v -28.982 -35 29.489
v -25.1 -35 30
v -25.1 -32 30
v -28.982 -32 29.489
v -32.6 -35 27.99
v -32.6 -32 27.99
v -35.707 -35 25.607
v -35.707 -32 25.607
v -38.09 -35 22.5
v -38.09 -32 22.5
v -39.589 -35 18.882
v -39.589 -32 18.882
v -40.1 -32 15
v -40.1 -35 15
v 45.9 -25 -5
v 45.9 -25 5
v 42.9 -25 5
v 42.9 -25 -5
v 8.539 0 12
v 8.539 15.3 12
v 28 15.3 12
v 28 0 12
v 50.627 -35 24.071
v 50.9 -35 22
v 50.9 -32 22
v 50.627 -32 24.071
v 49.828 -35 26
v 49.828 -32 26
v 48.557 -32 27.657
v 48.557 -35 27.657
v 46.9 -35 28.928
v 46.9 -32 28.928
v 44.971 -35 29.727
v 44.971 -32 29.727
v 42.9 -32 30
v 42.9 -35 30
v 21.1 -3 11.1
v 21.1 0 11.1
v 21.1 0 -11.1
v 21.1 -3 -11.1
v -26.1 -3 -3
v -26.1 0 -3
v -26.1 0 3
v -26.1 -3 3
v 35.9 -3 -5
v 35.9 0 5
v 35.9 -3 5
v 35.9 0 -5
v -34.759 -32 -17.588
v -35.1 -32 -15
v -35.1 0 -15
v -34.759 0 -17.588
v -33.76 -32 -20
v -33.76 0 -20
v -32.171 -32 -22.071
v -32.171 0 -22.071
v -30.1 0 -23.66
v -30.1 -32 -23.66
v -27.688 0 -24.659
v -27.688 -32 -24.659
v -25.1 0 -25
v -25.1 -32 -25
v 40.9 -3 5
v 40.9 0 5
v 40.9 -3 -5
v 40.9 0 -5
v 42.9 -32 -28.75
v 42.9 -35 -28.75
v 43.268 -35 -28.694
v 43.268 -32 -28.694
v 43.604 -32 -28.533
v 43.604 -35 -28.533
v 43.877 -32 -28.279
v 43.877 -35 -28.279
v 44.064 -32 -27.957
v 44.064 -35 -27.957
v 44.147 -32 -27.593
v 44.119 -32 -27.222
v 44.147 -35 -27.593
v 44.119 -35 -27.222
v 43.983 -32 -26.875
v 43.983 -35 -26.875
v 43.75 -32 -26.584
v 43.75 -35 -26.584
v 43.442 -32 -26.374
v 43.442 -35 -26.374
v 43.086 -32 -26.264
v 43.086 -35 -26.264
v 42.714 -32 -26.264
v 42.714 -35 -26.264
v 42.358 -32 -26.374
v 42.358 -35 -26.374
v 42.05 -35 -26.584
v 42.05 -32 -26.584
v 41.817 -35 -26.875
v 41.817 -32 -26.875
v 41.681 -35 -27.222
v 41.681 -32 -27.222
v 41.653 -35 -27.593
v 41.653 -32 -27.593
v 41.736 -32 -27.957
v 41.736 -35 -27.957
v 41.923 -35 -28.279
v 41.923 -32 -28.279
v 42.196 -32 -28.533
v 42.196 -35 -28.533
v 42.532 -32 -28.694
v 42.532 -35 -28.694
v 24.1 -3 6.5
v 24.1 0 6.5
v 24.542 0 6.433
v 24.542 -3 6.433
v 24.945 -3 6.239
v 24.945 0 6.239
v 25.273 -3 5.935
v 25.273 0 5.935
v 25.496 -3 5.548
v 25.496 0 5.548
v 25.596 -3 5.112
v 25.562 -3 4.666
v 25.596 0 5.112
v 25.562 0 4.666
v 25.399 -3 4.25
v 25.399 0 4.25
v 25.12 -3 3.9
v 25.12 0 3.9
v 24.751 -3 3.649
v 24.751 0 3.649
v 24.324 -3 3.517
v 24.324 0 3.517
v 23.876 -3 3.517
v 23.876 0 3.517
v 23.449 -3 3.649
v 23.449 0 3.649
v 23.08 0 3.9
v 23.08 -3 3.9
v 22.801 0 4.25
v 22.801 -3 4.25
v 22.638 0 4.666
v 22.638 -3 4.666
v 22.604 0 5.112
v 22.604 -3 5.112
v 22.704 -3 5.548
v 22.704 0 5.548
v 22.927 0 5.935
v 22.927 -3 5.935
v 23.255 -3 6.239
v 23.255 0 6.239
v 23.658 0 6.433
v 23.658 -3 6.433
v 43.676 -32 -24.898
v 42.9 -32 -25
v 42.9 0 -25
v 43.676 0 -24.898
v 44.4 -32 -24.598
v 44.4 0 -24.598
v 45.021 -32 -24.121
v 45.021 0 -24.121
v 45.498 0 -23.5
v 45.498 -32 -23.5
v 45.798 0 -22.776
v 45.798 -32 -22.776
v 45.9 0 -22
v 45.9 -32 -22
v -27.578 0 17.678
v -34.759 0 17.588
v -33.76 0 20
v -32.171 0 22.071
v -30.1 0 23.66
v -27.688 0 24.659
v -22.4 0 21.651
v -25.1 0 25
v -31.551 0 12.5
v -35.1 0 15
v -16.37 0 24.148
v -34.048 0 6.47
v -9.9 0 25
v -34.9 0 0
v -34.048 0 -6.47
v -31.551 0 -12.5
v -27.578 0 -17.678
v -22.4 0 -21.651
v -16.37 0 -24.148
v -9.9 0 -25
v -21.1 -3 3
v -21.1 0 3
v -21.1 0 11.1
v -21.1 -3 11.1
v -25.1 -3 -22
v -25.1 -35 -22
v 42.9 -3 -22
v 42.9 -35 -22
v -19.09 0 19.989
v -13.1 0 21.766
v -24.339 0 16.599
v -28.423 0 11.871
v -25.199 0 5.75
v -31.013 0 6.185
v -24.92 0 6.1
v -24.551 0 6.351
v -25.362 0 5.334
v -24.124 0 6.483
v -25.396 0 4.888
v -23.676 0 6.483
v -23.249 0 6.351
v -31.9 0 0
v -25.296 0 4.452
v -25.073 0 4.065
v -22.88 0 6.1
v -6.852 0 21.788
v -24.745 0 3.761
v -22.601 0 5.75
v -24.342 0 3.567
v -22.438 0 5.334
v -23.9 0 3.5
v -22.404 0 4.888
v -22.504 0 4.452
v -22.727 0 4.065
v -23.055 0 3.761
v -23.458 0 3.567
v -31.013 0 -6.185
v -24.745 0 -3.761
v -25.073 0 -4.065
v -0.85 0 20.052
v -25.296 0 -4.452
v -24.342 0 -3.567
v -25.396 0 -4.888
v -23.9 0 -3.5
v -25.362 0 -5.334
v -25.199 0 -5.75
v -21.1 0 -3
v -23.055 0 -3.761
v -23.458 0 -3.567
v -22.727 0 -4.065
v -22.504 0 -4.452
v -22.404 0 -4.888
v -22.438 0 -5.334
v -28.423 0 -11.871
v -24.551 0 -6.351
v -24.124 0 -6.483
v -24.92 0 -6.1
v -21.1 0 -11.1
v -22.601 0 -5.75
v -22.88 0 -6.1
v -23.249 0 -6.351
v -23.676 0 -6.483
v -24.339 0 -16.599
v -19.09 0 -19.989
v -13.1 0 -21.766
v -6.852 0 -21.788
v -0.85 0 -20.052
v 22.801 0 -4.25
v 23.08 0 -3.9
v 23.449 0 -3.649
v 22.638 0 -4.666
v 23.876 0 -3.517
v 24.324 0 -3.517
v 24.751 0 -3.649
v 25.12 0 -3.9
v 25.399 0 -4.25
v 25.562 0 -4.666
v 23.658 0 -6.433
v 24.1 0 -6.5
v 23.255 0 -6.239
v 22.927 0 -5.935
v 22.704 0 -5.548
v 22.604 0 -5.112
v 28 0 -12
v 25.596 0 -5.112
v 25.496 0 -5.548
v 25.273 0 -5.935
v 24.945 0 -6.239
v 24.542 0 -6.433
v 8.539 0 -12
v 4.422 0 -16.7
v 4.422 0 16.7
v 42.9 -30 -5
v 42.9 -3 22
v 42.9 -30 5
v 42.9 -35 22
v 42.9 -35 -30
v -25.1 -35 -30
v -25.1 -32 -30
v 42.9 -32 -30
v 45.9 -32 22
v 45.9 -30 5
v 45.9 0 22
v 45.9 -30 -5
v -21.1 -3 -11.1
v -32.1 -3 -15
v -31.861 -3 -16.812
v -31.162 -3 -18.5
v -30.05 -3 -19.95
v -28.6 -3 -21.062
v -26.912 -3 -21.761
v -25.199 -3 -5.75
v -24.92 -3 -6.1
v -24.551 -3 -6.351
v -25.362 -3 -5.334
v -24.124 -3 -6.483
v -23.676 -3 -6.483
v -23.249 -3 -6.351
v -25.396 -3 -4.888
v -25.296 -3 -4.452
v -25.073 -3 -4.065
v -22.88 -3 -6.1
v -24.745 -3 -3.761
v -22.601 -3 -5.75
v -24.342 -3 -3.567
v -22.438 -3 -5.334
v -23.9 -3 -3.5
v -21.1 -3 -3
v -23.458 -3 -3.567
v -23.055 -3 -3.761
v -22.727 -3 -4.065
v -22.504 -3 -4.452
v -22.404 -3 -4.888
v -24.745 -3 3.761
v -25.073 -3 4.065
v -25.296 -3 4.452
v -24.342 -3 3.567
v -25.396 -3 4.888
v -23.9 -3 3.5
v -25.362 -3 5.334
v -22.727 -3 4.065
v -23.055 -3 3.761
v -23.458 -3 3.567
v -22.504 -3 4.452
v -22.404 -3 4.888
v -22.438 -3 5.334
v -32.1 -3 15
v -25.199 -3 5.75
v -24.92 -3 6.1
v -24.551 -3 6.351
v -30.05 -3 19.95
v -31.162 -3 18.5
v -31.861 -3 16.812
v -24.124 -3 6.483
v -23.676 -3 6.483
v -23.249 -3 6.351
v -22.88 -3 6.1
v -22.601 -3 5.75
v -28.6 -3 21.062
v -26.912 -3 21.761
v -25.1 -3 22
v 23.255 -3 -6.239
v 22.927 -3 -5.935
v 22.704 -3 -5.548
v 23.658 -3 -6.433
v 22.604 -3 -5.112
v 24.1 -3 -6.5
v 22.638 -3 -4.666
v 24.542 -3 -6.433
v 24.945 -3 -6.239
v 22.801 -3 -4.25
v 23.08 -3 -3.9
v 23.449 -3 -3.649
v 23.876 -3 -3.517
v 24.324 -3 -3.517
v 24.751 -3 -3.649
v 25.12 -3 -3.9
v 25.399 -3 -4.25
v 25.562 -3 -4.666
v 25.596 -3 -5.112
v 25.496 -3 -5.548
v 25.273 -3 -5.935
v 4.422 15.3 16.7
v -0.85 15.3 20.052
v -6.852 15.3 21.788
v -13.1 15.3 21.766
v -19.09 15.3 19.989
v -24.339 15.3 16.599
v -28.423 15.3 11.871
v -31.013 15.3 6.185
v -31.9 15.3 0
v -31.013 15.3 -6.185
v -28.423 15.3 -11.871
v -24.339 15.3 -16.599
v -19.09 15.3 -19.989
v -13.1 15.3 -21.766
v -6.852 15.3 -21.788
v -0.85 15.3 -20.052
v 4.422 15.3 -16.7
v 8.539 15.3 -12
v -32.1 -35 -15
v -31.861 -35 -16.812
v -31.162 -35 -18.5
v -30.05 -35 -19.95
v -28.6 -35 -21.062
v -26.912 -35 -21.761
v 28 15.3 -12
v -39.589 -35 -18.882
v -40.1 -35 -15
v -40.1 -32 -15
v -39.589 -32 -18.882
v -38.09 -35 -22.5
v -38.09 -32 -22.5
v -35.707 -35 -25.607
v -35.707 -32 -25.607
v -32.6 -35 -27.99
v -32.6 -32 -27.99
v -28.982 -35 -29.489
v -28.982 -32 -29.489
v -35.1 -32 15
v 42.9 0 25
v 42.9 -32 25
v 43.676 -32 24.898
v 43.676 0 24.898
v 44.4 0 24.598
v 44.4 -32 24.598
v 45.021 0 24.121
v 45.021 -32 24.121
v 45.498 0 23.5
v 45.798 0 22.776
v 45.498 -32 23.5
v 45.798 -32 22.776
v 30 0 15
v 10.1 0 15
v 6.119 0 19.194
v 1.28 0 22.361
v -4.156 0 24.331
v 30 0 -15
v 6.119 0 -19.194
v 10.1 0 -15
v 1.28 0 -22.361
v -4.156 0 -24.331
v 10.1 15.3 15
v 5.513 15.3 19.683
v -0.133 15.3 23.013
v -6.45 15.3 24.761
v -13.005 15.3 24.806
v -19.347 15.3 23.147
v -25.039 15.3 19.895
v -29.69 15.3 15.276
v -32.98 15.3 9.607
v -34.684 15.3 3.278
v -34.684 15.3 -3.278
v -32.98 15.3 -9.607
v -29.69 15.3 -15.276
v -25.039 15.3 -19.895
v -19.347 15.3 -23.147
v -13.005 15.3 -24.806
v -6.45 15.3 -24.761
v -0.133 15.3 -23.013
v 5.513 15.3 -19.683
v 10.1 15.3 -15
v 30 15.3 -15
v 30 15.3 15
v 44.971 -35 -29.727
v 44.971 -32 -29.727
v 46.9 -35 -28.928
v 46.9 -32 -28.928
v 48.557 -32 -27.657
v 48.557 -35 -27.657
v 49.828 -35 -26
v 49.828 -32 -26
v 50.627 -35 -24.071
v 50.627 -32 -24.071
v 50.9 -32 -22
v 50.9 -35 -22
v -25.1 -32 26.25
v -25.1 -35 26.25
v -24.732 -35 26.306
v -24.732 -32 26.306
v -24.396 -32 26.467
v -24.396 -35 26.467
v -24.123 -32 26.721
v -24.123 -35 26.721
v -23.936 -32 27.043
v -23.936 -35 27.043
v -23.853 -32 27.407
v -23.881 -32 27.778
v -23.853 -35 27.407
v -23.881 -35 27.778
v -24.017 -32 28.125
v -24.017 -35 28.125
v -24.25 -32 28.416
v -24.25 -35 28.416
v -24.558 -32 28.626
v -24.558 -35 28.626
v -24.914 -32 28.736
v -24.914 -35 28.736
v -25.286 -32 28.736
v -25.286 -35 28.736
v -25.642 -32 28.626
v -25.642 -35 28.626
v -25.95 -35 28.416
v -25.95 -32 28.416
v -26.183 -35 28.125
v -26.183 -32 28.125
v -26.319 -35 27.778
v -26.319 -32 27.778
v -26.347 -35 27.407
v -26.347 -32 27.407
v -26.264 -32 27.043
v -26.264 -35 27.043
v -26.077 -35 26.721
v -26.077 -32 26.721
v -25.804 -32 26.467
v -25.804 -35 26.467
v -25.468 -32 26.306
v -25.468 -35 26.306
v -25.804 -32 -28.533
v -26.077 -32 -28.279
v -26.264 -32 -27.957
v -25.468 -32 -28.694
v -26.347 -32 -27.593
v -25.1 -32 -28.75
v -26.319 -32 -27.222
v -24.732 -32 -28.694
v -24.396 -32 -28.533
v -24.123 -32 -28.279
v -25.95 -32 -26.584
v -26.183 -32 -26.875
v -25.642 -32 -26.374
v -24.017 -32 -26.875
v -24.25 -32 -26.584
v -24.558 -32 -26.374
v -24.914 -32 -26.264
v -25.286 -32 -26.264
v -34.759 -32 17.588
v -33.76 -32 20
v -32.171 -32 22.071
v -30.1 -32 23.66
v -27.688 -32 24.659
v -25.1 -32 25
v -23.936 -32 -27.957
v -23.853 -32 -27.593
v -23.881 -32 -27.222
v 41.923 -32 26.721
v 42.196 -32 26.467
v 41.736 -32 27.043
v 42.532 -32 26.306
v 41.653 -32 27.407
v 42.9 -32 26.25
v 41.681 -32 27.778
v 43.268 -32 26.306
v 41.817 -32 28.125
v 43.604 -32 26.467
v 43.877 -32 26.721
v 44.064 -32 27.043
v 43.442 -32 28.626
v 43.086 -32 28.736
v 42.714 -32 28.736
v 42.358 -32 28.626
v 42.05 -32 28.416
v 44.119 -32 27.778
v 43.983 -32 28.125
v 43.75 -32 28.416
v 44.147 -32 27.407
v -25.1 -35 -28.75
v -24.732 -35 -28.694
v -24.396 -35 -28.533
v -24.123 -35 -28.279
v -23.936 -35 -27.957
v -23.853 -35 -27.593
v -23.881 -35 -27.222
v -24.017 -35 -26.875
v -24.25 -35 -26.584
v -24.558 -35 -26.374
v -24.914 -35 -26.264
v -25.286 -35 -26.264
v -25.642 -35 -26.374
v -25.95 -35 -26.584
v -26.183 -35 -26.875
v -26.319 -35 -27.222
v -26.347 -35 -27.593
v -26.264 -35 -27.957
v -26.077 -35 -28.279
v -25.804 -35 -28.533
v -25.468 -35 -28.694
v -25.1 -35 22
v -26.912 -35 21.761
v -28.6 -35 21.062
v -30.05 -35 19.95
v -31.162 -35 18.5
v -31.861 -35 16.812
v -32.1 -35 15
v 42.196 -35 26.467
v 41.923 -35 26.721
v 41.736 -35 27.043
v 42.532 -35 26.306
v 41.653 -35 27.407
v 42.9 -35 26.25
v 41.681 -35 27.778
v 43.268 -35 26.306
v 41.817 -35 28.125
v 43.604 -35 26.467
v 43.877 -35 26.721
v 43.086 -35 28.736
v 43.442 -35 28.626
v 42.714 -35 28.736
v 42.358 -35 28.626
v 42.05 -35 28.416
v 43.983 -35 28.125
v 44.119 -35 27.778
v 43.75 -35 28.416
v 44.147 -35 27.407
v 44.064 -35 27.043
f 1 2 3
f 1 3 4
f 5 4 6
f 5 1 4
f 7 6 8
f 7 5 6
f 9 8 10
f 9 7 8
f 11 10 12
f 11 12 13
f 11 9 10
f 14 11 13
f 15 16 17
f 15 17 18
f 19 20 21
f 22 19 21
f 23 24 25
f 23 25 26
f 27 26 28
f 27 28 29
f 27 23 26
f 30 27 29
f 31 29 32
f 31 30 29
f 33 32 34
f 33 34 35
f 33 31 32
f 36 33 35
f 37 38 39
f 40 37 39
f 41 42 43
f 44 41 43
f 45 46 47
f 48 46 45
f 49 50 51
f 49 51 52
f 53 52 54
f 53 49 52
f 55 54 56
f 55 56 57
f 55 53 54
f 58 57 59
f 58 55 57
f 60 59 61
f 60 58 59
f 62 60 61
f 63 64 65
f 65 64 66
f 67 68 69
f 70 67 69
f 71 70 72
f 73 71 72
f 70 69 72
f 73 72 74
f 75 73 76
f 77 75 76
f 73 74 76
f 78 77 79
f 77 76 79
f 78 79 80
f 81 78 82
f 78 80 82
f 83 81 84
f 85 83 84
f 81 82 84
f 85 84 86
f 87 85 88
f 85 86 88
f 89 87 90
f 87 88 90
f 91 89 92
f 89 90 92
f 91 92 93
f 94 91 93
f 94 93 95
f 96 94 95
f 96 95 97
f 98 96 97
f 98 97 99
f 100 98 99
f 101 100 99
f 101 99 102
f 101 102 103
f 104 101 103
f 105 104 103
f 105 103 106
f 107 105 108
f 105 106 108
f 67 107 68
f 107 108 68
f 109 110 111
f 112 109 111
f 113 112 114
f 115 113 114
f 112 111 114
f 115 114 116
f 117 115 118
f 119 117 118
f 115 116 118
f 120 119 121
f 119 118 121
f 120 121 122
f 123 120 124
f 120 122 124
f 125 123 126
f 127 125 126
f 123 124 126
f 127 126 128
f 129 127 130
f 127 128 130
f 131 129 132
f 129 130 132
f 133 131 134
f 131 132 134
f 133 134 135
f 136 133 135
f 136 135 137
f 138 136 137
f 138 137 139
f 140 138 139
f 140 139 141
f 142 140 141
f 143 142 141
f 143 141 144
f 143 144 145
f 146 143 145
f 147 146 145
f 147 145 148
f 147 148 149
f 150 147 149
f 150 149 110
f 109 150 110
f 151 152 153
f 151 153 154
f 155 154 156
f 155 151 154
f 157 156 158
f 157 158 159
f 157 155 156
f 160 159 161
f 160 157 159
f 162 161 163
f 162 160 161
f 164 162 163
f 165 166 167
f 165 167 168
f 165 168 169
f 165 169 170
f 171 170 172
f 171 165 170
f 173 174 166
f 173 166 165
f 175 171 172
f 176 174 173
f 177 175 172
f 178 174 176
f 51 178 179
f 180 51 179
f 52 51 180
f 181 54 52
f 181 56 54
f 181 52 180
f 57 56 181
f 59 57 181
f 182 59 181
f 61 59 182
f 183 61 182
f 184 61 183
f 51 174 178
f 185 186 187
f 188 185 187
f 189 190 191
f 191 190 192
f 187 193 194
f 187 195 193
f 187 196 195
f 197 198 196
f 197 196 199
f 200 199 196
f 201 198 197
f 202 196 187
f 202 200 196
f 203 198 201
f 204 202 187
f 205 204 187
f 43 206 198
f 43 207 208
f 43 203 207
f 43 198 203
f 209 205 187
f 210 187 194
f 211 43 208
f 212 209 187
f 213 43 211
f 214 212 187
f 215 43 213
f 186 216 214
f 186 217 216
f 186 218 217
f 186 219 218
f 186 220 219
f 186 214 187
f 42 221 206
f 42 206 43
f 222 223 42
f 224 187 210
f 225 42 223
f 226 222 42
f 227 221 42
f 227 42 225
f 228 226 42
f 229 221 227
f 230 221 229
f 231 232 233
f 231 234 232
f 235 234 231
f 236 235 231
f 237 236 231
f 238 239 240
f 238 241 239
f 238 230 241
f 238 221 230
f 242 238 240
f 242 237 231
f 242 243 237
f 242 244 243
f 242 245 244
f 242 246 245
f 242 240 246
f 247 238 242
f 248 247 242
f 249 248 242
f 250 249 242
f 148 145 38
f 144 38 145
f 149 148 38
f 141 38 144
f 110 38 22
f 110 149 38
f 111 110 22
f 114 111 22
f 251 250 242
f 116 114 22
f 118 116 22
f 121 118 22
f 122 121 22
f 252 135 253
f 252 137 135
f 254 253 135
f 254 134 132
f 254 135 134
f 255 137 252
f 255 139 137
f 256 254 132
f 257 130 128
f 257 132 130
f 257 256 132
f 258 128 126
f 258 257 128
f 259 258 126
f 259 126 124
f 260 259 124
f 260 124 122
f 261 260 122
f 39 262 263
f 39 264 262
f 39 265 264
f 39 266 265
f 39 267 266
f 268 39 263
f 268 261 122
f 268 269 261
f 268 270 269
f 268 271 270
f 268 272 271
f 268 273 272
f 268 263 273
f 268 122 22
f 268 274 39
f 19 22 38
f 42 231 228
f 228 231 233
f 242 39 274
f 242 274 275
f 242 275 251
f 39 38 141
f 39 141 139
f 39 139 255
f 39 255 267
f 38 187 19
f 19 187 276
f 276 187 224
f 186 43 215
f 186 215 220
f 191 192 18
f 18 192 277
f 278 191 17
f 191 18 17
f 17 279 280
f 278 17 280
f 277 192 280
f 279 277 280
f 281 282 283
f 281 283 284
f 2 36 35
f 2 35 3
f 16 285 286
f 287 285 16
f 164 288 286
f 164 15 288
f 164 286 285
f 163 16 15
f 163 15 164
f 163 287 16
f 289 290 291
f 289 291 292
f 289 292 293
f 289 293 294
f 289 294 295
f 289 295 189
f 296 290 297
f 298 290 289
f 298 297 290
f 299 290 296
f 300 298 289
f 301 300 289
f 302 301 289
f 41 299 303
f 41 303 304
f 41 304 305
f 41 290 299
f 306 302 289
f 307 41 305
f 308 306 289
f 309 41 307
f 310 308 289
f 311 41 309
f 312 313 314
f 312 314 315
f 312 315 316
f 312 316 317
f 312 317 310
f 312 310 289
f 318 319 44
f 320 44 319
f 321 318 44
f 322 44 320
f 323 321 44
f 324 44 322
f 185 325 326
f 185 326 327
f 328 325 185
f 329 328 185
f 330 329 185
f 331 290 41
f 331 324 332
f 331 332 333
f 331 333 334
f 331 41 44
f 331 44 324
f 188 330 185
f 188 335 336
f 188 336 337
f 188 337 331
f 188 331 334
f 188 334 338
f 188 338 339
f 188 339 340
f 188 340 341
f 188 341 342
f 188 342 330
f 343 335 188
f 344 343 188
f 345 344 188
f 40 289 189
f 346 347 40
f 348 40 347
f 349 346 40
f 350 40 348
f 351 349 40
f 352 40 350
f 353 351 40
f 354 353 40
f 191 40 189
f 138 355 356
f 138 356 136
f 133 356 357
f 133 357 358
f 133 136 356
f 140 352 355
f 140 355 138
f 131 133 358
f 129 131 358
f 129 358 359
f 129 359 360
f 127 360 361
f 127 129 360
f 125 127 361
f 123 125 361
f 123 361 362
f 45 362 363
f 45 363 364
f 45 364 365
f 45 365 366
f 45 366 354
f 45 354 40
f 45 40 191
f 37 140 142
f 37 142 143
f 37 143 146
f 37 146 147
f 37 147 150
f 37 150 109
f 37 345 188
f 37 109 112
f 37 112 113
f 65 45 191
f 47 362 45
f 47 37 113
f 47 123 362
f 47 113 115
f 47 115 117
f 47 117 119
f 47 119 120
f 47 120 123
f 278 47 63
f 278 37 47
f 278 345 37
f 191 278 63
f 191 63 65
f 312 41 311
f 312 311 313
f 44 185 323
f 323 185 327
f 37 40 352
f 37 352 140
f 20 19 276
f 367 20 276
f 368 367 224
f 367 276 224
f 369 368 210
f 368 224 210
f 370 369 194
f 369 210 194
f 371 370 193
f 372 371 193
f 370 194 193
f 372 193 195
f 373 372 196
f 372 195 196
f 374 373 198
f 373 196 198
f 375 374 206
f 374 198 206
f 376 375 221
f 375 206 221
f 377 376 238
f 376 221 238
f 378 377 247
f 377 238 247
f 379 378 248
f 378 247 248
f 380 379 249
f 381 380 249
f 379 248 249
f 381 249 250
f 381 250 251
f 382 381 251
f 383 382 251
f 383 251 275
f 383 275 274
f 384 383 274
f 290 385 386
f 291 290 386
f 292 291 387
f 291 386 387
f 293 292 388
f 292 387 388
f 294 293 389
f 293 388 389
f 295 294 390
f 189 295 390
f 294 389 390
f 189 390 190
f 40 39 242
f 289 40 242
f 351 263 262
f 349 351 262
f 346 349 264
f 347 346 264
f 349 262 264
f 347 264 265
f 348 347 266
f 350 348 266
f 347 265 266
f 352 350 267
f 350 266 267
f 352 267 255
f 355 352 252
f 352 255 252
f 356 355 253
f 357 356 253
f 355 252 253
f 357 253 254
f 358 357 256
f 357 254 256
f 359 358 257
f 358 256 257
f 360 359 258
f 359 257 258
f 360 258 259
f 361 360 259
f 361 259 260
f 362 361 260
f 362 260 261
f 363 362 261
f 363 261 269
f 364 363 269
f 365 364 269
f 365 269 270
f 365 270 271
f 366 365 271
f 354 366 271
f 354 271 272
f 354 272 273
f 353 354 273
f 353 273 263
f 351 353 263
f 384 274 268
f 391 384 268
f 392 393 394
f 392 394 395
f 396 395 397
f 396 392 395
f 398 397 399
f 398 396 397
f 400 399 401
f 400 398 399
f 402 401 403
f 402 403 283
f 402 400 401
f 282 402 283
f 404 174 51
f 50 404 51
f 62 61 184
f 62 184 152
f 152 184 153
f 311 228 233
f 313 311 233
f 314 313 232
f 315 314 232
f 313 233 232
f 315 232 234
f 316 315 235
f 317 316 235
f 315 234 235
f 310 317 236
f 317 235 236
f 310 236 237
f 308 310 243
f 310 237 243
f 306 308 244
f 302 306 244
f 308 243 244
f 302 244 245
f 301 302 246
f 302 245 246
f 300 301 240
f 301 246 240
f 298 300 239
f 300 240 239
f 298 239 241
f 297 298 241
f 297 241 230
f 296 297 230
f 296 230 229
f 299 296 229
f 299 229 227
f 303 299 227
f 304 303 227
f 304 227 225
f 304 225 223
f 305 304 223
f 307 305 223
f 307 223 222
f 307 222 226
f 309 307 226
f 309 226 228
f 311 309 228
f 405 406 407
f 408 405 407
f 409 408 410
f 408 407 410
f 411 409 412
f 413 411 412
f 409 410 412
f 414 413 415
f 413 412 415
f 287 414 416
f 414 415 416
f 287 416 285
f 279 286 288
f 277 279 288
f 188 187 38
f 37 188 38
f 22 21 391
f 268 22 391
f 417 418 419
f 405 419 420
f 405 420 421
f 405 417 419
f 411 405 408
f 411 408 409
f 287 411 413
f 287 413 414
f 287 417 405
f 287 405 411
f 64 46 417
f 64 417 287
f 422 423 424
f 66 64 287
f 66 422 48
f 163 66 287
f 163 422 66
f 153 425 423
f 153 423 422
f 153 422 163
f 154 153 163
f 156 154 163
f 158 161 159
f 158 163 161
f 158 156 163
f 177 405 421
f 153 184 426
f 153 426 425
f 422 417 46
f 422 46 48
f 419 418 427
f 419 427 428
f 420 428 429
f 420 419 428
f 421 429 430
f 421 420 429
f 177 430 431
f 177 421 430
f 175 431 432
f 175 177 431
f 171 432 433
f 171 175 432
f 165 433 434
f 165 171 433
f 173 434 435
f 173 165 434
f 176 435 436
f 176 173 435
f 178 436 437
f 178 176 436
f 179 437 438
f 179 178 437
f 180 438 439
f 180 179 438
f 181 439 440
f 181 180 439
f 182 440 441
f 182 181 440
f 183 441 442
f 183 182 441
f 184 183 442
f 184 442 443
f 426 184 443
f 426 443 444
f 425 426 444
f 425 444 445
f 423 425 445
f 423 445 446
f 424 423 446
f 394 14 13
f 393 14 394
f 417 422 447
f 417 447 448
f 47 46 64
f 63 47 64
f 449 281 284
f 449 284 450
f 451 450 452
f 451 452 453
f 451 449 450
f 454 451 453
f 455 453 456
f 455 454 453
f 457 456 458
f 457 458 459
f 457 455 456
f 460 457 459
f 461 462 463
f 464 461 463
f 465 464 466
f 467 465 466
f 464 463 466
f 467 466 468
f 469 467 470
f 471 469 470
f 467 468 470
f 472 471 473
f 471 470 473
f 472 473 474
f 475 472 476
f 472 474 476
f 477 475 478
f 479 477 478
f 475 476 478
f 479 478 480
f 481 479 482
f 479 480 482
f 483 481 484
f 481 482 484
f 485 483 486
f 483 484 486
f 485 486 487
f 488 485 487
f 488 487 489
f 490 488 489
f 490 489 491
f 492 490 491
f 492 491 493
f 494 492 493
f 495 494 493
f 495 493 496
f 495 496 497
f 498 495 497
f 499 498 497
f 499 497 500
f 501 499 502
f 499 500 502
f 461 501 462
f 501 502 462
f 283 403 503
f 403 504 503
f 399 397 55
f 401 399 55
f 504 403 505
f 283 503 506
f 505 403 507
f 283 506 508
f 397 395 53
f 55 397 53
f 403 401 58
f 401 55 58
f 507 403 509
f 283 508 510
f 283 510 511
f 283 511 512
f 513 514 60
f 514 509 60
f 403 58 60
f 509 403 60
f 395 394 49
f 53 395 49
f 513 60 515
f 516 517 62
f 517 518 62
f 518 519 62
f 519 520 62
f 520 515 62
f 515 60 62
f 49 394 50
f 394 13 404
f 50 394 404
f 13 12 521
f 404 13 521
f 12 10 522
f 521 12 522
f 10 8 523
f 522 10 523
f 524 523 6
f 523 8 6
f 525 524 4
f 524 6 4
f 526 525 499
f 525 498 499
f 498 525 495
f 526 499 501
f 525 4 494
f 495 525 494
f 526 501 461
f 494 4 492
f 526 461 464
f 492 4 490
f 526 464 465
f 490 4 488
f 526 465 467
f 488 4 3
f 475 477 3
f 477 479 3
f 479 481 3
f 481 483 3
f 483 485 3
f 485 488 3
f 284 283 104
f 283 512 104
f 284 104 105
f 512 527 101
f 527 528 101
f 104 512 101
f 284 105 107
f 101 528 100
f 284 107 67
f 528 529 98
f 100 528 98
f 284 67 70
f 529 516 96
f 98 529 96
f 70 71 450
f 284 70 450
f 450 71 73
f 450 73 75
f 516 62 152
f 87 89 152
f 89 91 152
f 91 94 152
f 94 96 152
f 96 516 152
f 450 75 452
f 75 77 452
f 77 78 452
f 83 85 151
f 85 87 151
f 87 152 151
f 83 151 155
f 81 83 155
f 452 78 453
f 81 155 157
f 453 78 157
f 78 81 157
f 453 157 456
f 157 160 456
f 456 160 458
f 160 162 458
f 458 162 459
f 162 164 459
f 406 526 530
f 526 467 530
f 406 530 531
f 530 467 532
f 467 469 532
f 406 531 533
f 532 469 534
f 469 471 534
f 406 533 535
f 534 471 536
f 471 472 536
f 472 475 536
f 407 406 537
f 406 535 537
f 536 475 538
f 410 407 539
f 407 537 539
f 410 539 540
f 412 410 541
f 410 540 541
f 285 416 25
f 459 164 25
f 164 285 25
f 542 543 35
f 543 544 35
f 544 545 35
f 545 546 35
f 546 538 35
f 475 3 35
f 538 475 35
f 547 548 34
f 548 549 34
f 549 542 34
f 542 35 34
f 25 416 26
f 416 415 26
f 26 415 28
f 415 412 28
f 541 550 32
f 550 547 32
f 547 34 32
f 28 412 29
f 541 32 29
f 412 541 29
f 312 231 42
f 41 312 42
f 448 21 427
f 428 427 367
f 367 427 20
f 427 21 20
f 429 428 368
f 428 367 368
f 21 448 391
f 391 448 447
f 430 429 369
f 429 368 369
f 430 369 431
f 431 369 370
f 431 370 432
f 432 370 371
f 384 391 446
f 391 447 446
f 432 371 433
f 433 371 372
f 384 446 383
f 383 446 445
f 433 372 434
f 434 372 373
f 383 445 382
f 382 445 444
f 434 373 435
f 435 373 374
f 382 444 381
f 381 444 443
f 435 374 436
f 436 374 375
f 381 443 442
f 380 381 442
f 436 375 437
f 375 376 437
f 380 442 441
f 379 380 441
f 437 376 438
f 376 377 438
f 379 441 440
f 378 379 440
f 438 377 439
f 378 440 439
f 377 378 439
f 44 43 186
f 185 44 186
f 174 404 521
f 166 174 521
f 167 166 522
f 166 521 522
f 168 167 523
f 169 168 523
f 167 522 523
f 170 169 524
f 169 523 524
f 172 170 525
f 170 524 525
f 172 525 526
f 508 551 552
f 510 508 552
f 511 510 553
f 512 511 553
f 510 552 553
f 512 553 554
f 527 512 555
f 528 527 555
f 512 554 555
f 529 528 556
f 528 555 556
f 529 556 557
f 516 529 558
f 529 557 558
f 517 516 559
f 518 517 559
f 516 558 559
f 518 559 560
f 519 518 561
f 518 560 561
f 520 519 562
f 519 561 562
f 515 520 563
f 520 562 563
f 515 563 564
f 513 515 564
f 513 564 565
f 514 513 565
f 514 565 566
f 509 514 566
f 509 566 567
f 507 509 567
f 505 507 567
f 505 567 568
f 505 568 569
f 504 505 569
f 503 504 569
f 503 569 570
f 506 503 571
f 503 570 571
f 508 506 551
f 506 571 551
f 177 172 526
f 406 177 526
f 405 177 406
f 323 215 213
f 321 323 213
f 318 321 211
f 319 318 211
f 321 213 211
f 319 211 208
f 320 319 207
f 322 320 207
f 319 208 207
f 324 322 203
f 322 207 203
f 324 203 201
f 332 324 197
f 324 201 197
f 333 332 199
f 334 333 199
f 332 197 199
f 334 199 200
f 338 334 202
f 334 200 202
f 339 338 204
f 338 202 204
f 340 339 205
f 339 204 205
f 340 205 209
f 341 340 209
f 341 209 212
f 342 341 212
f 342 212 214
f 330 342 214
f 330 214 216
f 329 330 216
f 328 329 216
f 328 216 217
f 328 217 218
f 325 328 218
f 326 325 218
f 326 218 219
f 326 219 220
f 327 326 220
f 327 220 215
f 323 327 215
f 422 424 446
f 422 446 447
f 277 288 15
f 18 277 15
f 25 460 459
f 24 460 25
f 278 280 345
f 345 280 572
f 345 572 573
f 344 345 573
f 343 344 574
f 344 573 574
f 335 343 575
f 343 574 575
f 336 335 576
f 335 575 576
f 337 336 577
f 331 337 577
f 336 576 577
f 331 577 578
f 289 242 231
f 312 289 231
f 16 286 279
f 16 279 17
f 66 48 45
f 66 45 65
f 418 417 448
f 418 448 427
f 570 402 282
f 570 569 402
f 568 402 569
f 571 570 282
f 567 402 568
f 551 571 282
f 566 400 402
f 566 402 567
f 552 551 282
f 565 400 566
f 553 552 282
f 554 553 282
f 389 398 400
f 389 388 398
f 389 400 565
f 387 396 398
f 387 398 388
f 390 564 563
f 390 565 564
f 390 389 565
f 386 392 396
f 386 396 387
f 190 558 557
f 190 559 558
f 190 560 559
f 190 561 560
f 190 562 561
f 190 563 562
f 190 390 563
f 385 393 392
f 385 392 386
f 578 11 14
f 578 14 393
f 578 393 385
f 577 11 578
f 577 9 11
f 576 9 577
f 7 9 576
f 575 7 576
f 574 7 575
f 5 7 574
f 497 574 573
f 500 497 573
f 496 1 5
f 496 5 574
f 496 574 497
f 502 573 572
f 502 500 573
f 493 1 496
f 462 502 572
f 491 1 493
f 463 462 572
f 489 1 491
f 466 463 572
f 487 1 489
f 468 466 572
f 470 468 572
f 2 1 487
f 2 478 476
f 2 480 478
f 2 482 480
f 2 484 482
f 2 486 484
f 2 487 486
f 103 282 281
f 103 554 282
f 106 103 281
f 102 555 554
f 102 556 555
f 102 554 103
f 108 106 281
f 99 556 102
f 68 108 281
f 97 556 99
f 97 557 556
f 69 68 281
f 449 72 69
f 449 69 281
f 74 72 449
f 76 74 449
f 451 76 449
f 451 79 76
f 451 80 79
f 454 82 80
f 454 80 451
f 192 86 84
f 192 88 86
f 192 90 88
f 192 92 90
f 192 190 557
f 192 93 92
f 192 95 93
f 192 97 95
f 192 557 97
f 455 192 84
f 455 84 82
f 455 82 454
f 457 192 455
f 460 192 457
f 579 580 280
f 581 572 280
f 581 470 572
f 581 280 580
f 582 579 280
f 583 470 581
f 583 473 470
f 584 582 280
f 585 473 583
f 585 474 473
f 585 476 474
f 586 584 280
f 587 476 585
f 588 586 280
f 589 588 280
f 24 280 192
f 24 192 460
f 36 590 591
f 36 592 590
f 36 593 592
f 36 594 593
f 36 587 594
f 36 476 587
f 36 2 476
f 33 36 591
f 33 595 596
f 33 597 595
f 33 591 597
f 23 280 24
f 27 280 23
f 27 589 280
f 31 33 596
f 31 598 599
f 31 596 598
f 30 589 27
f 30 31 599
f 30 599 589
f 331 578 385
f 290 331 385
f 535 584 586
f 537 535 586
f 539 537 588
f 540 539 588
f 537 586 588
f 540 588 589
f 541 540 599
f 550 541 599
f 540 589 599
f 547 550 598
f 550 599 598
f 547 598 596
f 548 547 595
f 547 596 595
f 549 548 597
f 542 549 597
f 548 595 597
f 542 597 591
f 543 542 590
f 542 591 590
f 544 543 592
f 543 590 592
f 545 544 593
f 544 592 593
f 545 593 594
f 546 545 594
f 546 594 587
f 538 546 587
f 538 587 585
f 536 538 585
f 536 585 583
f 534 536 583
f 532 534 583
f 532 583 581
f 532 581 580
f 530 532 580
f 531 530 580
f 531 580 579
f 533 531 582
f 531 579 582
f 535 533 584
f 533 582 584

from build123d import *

# Parameters (mm, degrees)
SKETCH1_W           = 81
SKETCH1_H           = 50
SKETCH1_R           = 1.5
BOSS_EXTRUDE1_DEPTH = 35
FILLET1_R           = 10
FILLET2_R           = 3
CUT_EXTRUDE1_DEPTH  = 32
BOSS_EXTRUDE2_DEPTH = 15.3
SKETCH4_W           = 1
SKETCH4_H           = 24
CUT_EXTRUDE2_DEPTH  = 15.3
SKETCH5_W           = 10
SKETCH5_H           = 5
CUT_EXTRUDE3_DEPTH  = 16.3
SKETCH6_R           = 1.25
BOSS_EXTRUDE3_DEPTH = 3
SKETCH7_W           = 5
SKETCH7_H           = 10
CUT_EXTRUDE4_DEPTH  = 10


with BuildPart() as part:
    # Sketch1 → Boss-Extrude1 (new body)
    with BuildSketch(Plane(origin=(0, 0, 0), x_dir=(1, 0, 0), z_dir=(0, 1, 0))):
        with Locations((5.4, 0)):
            Rectangle(SKETCH1_W, SKETCH1_H)
        with Locations(Location((-23.9, 5, 0), (0, 0, 270))):
            Circle(SKETCH1_R, mode=Mode.SUBTRACT)
        with Locations(Location((-23.9, -5, 0), (0, 0, 90))):
            Circle(SKETCH1_R, mode=Mode.SUBTRACT)
        with Locations(Location((24.1, 5, 0), (0, 0, 90))):
            Circle(SKETCH1_R, mode=Mode.SUBTRACT)
        with Locations(Location((24.1, -5, 0), (0, 0, 270))):
            Circle(SKETCH1_R, mode=Mode.SUBTRACT)
        Polygon((-21.1, 3), (-26.1, 3), (-26.1, -3), (-21.1, -3), (-21.1, -11.1), (21.1, -11.1), (21.1, 11.1), (-21.1, 11.1), align=None, mode=Mode.SUBTRACT)
    extrude(amount=-BOSS_EXTRUDE1_DEPTH)

    # Fillet1
    fillet1_edges = [part.edges().sort_by_distance(p)[0] for p in [
        (-35.1, -17.5, 25),
        (-35.1, -17.5, -25),
    ]]
    fillet(fillet1_edges, radius=FILLET1_R)

    # Fillet2
    fillet2_edges = [part.edges().sort_by_distance(p)[0] for p in [
        (45.9, -17.5, 25),
        (45.9, -17.5, -25),
    ]]
    fillet(fillet2_edges, radius=FILLET2_R)

    # Sketch3 → Cut-Extrude1 (cut)
    with BuildSketch(Plane.XZ.offset(35)):
        with BuildLine():
            Line((42.9, 22), (-25.1, 22))
            ThreePointArc((-25.1, 22), (-30.049747468, 19.949747468), (-32.1, 15))
            Line((-32.1, 15), (-32.1, -15))
            ThreePointArc((-32.1, -15), (-30.049747468, -19.949747468), (-25.1, -22))
            Line((-25.1, -22), (42.9, -22))
            Line((42.9, -22), (42.9, 22))
        make_face()
    extrude(amount=-CUT_EXTRUDE1_DEPTH, mode=Mode.SUBTRACT)

    # Sketch2 → Boss-Extrude2 (add)
    with BuildSketch(Plane(origin=(0, 0, 0), x_dir=(1, 0, 0), z_dir=(0, 1, 0))):
        with BuildLine():
            Line((10.1, 15), (30, 15))
            Line((30, 15), (30, -15))
            Line((30, -15), (10.1, -15))
            ThreePointArc((10.1, -15), (-34.9, 0), (10.1, 15))
        make_face()
        with BuildLine():
            Line((8.539088915, 12), (27, 12))
            Line((27, 12), (27, -12))
            Line((27, -12), (8.539088915, -12))
            ThreePointArc((8.539088915, -12), (-31.9, 0), (8.539088915, 12))
        make_face(mode=Mode.SUBTRACT)
    extrude(amount=BOSS_EXTRUDE2_DEPTH)

    # Sketch4 → Cut-Extrude2 (cut)
    with BuildSketch(Plane(origin=(0, 15.3, 0), x_dir=(1, 0, 0), z_dir=(0, 1, 0))):
        with Locations((27.5, 0)):
            Rectangle(SKETCH4_W, SKETCH4_H)
    extrude(amount=-CUT_EXTRUDE2_DEPTH, mode=Mode.SUBTRACT)

    # Sketch5 → Cut-Extrude3 (cut)
    with BuildSketch(Plane(origin=(45.9, 0, 0), x_dir=(0, 0, -1), z_dir=(1, 0, 0))):
        with Locations((0, -27.5)):
            Rectangle(SKETCH5_W, SKETCH5_H)
    extrude(amount=-CUT_EXTRUDE3_DEPTH, mode=Mode.SUBTRACT)

    # Sketch6 → Boss-Extrude3 (add)
    with BuildSketch(Plane.XZ.offset(35)):
        with BuildLine():
            Line((42.9, 30), (-25.1, 30))
            ThreePointArc((-25.1, 30), (-35.706601718, 25.606601718), (-40.1, 15))
            Line((-40.1, 15), (-40.1, -15))
            ThreePointArc((-40.1, -15), (-35.706601718, -25.606601718), (-25.1, -30))
            Line((-25.1, -30), (42.9, -30))
            ThreePointArc((42.9, -30), (48.556854249, -27.656854249), (50.9, -22))
            Line((50.9, -22), (50.9, 22))
            ThreePointArc((50.9, 22), (48.556854249, 27.656854249), (42.9, 30))
        make_face()
        with Locations(Location((-25.1, 27.5, 0), (0, 0, 270))):
            Circle(SKETCH6_R, mode=Mode.SUBTRACT)
        with Locations(Location((42.9, 27.5, 0), (0, 0, 270))):
            Circle(SKETCH6_R, mode=Mode.SUBTRACT)
        with Locations(Location((42.9, -27.5, 0), (0, 0, 270))):
            Circle(SKETCH6_R, mode=Mode.SUBTRACT)
        with Locations(Location((-25.1, -27.5, 0), (0, 0, 270))):
            Circle(SKETCH6_R, mode=Mode.SUBTRACT)
        with BuildLine():
            Line((45.9, -22), (45.9, 22))
            ThreePointArc((45.9, 22), (45.021320344, 24.121320344), (42.9, 25))
            Line((42.9, 25), (-25.1, 25))
            ThreePointArc((-25.1, 25), (-32.171067812, 22.071067812), (-35.1, 15))
            Line((-35.1, 15), (-35.1, -15))
            ThreePointArc((-35.1, -15), (-32.171067812, -22.071067812), (-25.1, -25))
            Line((-25.1, -25), (42.9, -25))
            ThreePointArc((42.9, -25), (45.021320344, -24.121320344), (45.9, -22))
        make_face(mode=Mode.SUBTRACT)
    extrude(amount=-BOSS_EXTRUDE3_DEPTH)

    # Sketch7 → Cut-Extrude4 (cut)
    with BuildSketch(Plane(origin=(0, 0, 0), x_dir=(1, 0, 0), z_dir=(0, 1, 0))):
        with Locations((38.4, 0)):
            Rectangle(SKETCH7_W, SKETCH7_H)
    extrude(amount=-CUT_EXTRUDE4_DEPTH, mode=Mode.SUBTRACT)


solid = part.part
